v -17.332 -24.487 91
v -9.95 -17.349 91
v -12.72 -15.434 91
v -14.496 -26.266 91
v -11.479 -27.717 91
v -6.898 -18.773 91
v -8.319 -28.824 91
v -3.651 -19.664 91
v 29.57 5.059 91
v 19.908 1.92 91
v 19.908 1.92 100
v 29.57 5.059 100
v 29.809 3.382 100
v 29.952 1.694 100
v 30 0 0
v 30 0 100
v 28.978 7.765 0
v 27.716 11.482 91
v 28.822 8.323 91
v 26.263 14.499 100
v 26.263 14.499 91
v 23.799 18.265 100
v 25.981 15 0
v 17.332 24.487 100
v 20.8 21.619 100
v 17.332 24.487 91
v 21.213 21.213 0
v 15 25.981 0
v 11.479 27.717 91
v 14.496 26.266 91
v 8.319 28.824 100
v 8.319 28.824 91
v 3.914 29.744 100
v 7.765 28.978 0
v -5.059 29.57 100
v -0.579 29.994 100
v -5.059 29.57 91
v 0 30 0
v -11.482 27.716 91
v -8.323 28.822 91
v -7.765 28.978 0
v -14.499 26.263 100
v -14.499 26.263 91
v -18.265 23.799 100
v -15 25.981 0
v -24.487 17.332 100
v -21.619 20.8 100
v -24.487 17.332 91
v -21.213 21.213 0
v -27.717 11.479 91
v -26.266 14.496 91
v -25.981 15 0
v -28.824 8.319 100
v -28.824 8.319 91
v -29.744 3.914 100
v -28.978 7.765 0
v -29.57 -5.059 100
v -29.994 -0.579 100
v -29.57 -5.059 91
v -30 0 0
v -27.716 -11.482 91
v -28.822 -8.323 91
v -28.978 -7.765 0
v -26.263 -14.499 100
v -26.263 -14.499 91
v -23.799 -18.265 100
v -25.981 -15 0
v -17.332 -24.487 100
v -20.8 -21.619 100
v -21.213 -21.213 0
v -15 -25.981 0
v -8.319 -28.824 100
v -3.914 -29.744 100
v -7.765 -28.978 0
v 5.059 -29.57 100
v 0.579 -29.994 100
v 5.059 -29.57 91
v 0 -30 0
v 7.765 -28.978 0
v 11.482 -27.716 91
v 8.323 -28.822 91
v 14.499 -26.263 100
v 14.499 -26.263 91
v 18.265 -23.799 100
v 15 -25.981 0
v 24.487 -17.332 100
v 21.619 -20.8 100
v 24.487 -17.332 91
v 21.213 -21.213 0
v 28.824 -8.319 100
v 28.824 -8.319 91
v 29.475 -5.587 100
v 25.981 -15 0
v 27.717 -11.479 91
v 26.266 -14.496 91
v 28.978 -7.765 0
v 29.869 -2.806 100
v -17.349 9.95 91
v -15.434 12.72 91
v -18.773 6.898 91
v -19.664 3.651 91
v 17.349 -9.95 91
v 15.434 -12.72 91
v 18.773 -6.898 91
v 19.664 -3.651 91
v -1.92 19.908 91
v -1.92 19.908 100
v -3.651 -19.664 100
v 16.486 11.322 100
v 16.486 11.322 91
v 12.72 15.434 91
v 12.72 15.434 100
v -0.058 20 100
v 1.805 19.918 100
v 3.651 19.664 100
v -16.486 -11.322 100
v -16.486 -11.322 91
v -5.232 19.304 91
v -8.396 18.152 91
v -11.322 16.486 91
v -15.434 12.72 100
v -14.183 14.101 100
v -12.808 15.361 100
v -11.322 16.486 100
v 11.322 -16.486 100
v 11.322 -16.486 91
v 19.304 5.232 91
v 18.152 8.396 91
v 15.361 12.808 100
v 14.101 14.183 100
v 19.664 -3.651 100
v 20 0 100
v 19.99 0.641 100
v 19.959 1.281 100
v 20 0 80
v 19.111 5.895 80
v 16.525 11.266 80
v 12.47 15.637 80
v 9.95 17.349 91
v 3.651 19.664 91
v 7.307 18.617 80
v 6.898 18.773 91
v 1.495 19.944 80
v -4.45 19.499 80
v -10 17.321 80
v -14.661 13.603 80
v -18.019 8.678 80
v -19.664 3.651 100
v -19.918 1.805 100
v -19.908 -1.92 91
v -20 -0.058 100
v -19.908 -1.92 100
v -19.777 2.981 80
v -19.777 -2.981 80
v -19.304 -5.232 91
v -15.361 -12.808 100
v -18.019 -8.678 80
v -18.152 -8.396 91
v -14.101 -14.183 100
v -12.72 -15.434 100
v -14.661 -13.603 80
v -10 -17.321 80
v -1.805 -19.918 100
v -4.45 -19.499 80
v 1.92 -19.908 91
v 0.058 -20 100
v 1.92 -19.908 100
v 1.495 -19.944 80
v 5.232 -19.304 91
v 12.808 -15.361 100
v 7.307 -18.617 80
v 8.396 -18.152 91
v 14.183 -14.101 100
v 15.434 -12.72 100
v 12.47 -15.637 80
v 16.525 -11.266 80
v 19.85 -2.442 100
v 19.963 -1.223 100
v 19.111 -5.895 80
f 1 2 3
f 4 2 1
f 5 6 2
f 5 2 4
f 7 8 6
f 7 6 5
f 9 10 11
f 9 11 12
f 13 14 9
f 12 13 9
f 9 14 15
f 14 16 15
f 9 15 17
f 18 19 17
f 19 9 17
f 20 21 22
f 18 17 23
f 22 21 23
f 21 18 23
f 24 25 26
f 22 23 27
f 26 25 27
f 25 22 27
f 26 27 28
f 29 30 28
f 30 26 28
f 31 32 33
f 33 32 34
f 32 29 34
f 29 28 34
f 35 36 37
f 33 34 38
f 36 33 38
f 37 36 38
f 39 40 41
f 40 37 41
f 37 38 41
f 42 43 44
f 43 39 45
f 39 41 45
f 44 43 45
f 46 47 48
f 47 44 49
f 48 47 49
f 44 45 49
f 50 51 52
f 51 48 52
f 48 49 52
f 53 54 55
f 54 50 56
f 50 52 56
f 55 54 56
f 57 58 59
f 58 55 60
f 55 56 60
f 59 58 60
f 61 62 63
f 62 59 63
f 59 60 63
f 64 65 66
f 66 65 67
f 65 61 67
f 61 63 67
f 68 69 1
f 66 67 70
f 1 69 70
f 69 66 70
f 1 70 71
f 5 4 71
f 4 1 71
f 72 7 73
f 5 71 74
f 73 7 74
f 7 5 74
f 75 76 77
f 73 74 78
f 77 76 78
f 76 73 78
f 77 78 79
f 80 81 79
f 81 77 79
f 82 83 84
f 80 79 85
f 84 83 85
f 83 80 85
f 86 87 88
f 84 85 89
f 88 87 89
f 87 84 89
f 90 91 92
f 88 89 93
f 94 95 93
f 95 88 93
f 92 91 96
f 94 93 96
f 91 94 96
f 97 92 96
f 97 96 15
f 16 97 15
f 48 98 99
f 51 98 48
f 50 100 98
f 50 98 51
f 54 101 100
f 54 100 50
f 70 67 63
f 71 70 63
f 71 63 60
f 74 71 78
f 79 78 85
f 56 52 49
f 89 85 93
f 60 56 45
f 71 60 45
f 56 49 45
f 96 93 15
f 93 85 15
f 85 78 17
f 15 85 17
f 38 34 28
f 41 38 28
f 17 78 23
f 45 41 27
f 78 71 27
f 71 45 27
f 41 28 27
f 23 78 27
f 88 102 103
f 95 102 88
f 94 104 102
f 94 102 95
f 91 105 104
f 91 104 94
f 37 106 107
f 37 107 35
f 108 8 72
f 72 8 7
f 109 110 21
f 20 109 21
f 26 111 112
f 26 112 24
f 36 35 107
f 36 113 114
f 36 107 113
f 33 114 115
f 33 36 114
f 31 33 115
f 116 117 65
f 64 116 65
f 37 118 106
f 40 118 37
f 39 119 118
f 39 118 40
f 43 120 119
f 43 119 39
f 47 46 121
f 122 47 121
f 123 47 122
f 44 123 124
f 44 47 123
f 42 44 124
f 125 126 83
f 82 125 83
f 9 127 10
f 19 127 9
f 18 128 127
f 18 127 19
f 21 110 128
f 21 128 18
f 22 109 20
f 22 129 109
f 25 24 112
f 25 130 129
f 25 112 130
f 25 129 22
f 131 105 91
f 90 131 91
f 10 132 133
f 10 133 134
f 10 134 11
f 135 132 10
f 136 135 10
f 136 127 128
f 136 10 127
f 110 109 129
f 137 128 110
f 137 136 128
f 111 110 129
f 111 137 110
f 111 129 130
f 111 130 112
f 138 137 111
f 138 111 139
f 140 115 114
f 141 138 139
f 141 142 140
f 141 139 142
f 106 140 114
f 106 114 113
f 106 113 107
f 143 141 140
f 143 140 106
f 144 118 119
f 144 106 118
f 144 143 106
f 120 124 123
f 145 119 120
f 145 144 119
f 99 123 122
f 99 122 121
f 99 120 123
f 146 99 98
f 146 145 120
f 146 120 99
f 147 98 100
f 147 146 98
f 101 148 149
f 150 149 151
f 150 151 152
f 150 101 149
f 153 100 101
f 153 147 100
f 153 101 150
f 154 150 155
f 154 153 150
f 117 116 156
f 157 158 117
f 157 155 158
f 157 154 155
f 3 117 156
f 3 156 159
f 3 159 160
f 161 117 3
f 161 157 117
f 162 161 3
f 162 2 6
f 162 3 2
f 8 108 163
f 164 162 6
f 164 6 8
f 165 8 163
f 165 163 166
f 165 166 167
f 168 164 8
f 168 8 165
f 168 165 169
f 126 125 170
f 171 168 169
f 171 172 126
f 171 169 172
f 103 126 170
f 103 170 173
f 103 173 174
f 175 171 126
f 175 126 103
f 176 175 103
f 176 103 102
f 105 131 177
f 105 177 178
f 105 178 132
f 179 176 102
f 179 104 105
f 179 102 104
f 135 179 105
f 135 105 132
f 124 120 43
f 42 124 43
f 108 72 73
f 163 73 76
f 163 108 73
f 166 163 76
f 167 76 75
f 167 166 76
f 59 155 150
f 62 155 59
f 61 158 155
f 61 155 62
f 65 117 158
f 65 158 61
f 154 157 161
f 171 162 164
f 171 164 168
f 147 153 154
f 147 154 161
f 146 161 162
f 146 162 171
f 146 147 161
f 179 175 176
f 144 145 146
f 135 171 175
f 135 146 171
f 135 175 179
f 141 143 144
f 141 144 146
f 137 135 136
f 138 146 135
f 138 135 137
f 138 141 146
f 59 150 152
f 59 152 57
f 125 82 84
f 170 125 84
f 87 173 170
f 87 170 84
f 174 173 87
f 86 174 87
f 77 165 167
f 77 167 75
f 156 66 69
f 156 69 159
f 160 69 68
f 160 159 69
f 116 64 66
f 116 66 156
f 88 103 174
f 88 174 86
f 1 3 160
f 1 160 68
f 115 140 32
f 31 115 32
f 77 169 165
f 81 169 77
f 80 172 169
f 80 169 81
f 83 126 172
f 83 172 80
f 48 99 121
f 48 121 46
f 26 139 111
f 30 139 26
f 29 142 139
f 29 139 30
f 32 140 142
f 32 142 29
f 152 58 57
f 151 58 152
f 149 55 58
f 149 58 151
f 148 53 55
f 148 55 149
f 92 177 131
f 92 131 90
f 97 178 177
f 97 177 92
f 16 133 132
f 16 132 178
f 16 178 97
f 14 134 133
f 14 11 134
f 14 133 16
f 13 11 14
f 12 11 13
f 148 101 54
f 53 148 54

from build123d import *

# Parameters (mm, degrees)
BOX_W               = 20
BOX_H               = 10
BOX_DEPTH           = 10
BOX_PLACEMENT_ANGLE = 18
ARRAY_COUNT         = 8
CYLINDER001_R       = 20
CYLINDER001_DEPTH   = 20
CYLINDER_R          = 30
CYLINDER_DEPTH      = 100


with BuildPart() as rectangles:
    # Box → Box (new body)
    with BuildSketch(Plane.XY):
        with Locations((10, 5)):
            Rectangle(BOX_W, BOX_H)
    extrude(amount=BOX_DEPTH)


with BuildPart() as rectangles_1:
    # Box placement: moved
    add(rectangles.part.moved(Location((14, 0, 91))).rotate(Axis((14, 0, 91), (0, 0, 1)), BOX_PLACEMENT_ANGLE))

    # Array: Rectangles ×8 about axis
    array_axis = Axis((0, 0, 0), (0, 0, 1))


with BuildPart() as rectangles_2:
    add(rectangles_1.part)
    for i in range(1, ARRAY_COUNT):
        add(rectangles_1.part.rotate(array_axis, i * 360 / ARRAY_COUNT))


with BuildPart() as cilindre001:
    # Cylinder001 → Cylinder001 (new body)
    with BuildSketch(Plane.XY.offset(80)):
        Circle(CYLINDER001_R)
    extrude(amount=CYLINDER001_DEPTH)


with BuildPart() as castell:
    # Cylinder → Cylinder (new body)
    with BuildSketch(Plane.XY):
        Circle(CYLINDER_R)
    extrude(amount=CYLINDER_DEPTH)

    # Cut: cut Cilindre001
    add(cilindre001.part, mode=Mode.SUBTRACT)

    # Cut001: cut Rectangles
    add(rectangles_2.part, mode=Mode.SUBTRACT)


solid = castell.part
